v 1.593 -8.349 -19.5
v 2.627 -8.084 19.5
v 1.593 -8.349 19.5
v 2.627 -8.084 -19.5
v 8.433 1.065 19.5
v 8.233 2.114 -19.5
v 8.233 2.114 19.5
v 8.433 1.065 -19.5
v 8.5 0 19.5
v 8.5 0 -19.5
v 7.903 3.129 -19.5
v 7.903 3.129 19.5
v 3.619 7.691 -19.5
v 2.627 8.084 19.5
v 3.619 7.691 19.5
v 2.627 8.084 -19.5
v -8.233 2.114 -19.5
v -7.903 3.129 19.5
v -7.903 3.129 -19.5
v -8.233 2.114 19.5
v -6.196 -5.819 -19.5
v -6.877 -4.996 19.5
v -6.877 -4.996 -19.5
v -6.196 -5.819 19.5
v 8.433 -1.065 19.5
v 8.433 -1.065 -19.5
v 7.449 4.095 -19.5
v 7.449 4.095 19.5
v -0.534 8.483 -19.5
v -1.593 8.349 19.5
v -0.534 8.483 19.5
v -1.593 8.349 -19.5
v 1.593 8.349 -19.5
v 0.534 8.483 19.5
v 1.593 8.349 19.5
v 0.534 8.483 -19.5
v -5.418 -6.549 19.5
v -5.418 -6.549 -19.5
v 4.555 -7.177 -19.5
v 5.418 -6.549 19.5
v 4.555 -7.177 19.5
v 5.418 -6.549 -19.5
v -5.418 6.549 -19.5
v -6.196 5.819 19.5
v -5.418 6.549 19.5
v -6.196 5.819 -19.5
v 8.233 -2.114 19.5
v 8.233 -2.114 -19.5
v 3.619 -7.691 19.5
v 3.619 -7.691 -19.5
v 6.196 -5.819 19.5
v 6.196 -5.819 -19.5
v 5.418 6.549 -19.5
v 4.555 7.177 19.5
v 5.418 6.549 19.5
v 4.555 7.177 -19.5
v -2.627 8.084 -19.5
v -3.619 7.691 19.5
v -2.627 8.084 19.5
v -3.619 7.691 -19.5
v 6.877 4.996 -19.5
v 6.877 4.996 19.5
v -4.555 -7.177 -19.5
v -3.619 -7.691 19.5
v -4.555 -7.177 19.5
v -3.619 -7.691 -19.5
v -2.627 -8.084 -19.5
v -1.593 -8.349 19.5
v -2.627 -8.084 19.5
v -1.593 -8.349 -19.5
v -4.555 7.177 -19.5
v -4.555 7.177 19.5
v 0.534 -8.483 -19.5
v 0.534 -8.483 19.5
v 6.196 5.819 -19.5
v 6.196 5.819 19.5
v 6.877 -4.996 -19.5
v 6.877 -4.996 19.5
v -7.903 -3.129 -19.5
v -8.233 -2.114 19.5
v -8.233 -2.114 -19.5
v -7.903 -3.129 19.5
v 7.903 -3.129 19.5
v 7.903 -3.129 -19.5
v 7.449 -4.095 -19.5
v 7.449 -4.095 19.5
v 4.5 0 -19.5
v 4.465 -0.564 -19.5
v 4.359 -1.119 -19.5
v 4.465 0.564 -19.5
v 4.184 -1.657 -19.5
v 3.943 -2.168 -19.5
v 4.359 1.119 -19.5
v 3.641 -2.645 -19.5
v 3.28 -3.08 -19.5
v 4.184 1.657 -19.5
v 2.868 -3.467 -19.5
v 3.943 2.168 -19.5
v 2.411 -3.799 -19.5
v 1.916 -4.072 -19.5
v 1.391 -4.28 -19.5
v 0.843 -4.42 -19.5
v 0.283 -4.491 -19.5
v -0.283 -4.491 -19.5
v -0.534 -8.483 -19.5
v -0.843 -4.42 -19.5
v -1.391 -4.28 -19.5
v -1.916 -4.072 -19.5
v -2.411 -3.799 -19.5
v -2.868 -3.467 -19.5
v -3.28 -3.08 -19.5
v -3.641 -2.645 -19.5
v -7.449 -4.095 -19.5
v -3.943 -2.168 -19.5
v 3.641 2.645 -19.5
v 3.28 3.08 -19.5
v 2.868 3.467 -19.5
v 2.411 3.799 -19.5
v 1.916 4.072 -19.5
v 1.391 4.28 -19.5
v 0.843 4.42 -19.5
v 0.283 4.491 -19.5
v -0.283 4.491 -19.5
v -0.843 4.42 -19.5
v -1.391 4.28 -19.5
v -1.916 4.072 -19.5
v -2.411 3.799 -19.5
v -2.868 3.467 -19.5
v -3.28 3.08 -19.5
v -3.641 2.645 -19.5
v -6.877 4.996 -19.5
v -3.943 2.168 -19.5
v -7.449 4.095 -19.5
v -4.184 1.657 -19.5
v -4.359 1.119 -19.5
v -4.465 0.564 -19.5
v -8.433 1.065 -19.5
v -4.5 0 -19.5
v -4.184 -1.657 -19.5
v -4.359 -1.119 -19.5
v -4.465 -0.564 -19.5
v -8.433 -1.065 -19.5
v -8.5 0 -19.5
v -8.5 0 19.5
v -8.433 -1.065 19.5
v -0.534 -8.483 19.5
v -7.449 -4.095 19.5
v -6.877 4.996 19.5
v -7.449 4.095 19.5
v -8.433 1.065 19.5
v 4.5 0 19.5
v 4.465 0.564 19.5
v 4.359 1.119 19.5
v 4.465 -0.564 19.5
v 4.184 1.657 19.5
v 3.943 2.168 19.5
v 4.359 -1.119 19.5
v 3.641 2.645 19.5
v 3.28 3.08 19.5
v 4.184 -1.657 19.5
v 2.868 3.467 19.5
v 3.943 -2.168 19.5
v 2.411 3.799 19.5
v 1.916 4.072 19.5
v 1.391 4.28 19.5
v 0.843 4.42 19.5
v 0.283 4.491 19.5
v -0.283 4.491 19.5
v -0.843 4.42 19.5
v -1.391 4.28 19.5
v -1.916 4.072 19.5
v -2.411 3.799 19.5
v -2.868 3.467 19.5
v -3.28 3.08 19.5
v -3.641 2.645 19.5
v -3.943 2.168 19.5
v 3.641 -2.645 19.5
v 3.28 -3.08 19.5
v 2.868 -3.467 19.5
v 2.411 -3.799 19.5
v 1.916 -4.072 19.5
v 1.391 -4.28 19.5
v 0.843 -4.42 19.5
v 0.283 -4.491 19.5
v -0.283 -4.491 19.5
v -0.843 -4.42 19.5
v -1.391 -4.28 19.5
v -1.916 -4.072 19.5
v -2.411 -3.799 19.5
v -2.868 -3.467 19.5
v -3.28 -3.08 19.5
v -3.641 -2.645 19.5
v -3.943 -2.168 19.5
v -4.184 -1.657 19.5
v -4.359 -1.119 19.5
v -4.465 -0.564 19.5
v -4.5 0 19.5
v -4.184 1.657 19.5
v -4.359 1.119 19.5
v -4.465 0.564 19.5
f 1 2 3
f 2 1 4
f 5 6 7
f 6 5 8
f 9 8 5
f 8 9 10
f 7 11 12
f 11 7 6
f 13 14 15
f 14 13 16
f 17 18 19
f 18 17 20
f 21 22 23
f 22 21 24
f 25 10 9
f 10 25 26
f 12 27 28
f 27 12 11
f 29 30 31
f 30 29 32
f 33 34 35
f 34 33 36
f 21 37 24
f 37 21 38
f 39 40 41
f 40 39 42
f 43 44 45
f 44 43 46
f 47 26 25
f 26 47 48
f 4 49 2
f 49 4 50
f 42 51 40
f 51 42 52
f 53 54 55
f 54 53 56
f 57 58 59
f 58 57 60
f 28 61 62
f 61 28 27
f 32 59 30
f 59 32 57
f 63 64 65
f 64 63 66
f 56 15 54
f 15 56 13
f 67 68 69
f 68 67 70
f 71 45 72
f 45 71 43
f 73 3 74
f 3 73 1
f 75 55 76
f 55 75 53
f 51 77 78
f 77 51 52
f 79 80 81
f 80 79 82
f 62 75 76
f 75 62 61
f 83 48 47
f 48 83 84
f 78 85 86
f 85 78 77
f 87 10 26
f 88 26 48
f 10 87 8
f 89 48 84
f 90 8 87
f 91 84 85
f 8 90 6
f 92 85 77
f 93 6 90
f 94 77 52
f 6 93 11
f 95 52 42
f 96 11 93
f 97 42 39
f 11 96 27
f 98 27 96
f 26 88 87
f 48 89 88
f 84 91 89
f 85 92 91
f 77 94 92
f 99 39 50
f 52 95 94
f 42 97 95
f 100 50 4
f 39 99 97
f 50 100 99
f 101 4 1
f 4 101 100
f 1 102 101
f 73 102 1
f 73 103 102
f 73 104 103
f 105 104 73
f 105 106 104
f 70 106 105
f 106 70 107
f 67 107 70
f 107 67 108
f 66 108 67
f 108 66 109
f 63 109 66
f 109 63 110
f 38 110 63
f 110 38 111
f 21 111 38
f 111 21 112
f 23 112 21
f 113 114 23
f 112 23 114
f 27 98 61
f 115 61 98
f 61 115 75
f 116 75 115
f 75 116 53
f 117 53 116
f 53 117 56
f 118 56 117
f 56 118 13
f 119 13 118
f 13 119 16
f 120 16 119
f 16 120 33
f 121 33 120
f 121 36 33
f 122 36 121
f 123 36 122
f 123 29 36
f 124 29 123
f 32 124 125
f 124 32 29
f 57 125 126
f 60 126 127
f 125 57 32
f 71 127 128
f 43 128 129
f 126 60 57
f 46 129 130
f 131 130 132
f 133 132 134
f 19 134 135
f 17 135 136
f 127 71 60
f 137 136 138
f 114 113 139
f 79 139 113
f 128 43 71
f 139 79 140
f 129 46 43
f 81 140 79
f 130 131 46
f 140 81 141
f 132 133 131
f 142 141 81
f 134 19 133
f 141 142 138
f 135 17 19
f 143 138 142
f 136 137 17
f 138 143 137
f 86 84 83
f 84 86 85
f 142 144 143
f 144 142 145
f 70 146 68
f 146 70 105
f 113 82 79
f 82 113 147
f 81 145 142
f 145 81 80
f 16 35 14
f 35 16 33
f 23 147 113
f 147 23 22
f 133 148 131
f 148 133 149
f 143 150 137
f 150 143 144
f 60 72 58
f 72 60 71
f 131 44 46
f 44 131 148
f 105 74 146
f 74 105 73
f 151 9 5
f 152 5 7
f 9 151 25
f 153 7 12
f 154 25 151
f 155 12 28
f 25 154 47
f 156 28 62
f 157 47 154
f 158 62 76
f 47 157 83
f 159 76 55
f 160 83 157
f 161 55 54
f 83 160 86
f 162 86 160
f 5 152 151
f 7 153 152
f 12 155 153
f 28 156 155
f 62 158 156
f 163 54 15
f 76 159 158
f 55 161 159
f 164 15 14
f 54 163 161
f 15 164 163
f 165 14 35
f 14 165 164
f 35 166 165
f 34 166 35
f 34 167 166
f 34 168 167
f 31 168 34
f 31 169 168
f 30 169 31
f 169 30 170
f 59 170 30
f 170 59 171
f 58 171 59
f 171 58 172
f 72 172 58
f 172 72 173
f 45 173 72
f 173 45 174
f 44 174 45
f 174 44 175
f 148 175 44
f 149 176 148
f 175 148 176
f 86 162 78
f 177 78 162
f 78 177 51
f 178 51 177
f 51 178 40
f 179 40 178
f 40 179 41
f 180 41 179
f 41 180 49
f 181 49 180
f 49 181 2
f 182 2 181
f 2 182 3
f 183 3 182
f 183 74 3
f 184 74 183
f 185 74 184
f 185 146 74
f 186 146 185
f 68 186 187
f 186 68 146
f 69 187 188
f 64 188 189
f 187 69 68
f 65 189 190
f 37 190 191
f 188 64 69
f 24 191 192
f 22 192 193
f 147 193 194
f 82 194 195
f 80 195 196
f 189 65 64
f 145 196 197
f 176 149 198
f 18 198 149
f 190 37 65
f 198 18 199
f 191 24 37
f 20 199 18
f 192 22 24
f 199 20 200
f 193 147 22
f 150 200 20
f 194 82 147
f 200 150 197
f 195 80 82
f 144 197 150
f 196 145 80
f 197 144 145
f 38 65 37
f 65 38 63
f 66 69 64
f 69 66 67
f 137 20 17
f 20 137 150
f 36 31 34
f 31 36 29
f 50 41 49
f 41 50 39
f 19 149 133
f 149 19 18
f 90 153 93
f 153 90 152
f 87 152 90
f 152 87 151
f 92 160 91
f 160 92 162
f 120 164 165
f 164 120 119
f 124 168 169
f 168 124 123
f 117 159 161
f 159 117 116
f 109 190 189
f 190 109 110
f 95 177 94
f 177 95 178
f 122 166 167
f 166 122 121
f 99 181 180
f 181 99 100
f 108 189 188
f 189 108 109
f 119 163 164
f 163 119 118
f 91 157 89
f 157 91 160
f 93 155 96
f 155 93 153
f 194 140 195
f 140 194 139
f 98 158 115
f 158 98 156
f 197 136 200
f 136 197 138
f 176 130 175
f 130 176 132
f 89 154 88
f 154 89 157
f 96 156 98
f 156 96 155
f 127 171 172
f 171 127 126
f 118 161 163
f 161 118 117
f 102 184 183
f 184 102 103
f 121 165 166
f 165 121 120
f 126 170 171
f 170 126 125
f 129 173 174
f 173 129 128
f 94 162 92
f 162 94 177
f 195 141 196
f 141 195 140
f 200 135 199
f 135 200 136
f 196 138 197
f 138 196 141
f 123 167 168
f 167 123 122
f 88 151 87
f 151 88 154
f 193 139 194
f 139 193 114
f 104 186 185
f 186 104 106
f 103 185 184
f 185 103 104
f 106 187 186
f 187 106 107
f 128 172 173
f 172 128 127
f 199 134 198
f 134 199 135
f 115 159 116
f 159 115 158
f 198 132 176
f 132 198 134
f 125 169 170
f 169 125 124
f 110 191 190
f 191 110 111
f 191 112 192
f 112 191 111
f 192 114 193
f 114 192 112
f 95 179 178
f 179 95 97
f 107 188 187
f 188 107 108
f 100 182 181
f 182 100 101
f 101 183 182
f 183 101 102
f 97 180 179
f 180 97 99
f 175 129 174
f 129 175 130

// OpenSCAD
$fn = 50;


difference() {
	union() {
		translate(v = [0, 0, -19.5000000000]) {
			cylinder(h = 39, r = 8.5000000000);
		}
	}
	union() {
		translate(v = [0, 0, -100.0000000000]) {
			cylinder(h = 200, r = 4.5000000000);
		}
	}
}
